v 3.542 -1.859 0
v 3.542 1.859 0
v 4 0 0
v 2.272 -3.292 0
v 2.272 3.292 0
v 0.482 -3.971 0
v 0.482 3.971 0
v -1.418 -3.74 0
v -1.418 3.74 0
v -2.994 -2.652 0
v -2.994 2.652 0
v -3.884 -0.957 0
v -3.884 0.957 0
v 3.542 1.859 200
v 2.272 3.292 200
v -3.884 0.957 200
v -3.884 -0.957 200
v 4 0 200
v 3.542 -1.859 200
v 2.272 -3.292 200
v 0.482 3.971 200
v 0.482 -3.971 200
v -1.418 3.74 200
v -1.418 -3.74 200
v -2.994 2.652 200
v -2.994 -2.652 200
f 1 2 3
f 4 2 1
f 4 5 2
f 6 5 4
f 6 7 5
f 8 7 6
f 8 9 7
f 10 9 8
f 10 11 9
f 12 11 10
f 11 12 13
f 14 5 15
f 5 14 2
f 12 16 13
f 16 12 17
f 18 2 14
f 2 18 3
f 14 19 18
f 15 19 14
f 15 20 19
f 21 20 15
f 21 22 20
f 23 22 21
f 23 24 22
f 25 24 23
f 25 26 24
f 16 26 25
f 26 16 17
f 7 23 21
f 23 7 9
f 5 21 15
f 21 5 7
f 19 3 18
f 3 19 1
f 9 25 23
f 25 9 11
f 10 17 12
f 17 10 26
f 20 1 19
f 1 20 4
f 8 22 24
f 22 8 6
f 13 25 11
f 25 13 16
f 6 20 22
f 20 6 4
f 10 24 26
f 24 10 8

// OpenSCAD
// file: variables.scad
// Pinya3 3D Food Printer
// file: variables.scad 
// author: Luis Rodriguez
// version: 0.1
// w3b: 3digitalcooks.com 

// Variables for all the project
// just numbers??
alpha = 0.7;

// FRAME 
frame_alpha = alpha;
frame_profile_width = 20;

frame_height = 370;
frame_width = 250;  // 250mm -> 7capsules~de 8cm
frame_lenght = 200;

// PRINTING AREA
// from: https://www.marginallyclever.com/other/samples/fk-ik-test.html
// Base radius (f) = 80mm
// End Effector radius (e) = 30mm
// Bice length (rf) = 200mm
// Forearm length = 260mm
// PA = 260 x 260 x 260
// X=-128.225 to 128.225 mm 
// Y=-128.225 to 128.225 mm
// Z=-387.23 to -130.781 mm
printing_area_alpha = 0.2;
printing_area_x = 128*2;//195*2;
printing_area_y = 128*2;//195*2;
printing_area_distance_from_motors_base = 130;//151
printing_area_z_max = 387;
printing_area_z = printing_area_z_max - printing_area_distance_from_motors_base;//540-151;
echo("printing z =",printing_area_z);
printing_area_x_displacement = frame_width/2 + printing_area_x/2;

// FOREARM 
forearm_alpha = alpha;
forearm_length = 200;
forearm_rad = 4;
forearm_motors_joint_rad = 25;

// MOTORS BASE
motors_base_alpha = alpha;
motors_base_thickness = 6;
motors_base_rad = forearm_motors_joint_rad;

// DELTA BEAM
delta_beam_alpha = alpha;
delta_beam_length = printing_area_x_displacement 
                    + forearm_motors_joint_rad 
                    + frame_width/2;
echo("Delta beam lenght = ", delta_beam_length);
delta_beam_profile_width = frame_profile_width*3; //60cm
delta_beam_under_frame = 0; // 1 = Beam under frame or 0 = Beam on frame
delta_beam_bolt_rad = 4;
delta_beam_distance_btw_slots = 20;


// CAROUSEL
carousel_alpha = 0.3;
carousel_number_of_tools = 11;
carousel_offset_rotation = 0; // in degrees
carousel_rad = frame_width-20;//160;
carousel_tool_height = 180;
carousel_tool_rad = 40;

// GEARED STEPPER
stepper_shaft_diameter = 8;

// MOTOR BICEP JOINT
motor_bicep_joint_shaft_holder_diameter = 21;
motor_bicep_joint_shaft_holder_thickness = 12;

motor_bicep_joint_bicep_holder_width = motor_bicep_joint_shaft_holder_thickness;
motor_bicep_joint_bicep_holder_length = 20 + motor_bicep_joint_shaft_holder_diameter/2;

motor_bicep_joint_bicep_insert_lenght = 20;

motor_bicep_joint_shaft_bolt_lenght = 12;
motor_bicep_joint_shaft_bolt_diameter = 3.25;

motor_bicep_joint_bicep_bolt_diameter = motor_bicep_joint_shaft_bolt_diameter;
motor_bicep_joint_bicep_bolt_lenght = 30;

motor_bicep_joint_shaft_nut_thickness = 3;
motor_bicep_joint_shaft_nut_width = 6.2;
motor_bicep_joint_shaft_nut_hole_height = 30;
motor_bicep_joint_shaft_nut_displacement = stepper_shaft_diameter/3 + 
            (motor_bicep_joint_shaft_holder_diameter/2 - stepper_shaft_diameter/2)/2;
motor_bicep_joint_bicep_nut_diameter = 6.5;
motor_bicep_joint_bicep_nut_thickness = motor_bicep_joint_shaft_nut_thickness;

motor_bicep_joint_shaft_flat_displecement = -4.6;
// BICEP
bicep_diameter = 8;
// main file
// Pinya3 3D Food Printer
// file: forearm.scad 
// author: Luis Rodriguez
// version: 0.1
// w3b: 3digitalcooks.com

include <variables.scad>

forearm();

module forearm(){
  difference(){
    union(){ // Add
      forearm_bar();
    }
    union(){ // Substract
    }
  }
}


module forearm_bar() {
      color("OrangeRed", forearm_alpha)
      cylinder(h = forearm_length, r = forearm_rad, center=false);


}
